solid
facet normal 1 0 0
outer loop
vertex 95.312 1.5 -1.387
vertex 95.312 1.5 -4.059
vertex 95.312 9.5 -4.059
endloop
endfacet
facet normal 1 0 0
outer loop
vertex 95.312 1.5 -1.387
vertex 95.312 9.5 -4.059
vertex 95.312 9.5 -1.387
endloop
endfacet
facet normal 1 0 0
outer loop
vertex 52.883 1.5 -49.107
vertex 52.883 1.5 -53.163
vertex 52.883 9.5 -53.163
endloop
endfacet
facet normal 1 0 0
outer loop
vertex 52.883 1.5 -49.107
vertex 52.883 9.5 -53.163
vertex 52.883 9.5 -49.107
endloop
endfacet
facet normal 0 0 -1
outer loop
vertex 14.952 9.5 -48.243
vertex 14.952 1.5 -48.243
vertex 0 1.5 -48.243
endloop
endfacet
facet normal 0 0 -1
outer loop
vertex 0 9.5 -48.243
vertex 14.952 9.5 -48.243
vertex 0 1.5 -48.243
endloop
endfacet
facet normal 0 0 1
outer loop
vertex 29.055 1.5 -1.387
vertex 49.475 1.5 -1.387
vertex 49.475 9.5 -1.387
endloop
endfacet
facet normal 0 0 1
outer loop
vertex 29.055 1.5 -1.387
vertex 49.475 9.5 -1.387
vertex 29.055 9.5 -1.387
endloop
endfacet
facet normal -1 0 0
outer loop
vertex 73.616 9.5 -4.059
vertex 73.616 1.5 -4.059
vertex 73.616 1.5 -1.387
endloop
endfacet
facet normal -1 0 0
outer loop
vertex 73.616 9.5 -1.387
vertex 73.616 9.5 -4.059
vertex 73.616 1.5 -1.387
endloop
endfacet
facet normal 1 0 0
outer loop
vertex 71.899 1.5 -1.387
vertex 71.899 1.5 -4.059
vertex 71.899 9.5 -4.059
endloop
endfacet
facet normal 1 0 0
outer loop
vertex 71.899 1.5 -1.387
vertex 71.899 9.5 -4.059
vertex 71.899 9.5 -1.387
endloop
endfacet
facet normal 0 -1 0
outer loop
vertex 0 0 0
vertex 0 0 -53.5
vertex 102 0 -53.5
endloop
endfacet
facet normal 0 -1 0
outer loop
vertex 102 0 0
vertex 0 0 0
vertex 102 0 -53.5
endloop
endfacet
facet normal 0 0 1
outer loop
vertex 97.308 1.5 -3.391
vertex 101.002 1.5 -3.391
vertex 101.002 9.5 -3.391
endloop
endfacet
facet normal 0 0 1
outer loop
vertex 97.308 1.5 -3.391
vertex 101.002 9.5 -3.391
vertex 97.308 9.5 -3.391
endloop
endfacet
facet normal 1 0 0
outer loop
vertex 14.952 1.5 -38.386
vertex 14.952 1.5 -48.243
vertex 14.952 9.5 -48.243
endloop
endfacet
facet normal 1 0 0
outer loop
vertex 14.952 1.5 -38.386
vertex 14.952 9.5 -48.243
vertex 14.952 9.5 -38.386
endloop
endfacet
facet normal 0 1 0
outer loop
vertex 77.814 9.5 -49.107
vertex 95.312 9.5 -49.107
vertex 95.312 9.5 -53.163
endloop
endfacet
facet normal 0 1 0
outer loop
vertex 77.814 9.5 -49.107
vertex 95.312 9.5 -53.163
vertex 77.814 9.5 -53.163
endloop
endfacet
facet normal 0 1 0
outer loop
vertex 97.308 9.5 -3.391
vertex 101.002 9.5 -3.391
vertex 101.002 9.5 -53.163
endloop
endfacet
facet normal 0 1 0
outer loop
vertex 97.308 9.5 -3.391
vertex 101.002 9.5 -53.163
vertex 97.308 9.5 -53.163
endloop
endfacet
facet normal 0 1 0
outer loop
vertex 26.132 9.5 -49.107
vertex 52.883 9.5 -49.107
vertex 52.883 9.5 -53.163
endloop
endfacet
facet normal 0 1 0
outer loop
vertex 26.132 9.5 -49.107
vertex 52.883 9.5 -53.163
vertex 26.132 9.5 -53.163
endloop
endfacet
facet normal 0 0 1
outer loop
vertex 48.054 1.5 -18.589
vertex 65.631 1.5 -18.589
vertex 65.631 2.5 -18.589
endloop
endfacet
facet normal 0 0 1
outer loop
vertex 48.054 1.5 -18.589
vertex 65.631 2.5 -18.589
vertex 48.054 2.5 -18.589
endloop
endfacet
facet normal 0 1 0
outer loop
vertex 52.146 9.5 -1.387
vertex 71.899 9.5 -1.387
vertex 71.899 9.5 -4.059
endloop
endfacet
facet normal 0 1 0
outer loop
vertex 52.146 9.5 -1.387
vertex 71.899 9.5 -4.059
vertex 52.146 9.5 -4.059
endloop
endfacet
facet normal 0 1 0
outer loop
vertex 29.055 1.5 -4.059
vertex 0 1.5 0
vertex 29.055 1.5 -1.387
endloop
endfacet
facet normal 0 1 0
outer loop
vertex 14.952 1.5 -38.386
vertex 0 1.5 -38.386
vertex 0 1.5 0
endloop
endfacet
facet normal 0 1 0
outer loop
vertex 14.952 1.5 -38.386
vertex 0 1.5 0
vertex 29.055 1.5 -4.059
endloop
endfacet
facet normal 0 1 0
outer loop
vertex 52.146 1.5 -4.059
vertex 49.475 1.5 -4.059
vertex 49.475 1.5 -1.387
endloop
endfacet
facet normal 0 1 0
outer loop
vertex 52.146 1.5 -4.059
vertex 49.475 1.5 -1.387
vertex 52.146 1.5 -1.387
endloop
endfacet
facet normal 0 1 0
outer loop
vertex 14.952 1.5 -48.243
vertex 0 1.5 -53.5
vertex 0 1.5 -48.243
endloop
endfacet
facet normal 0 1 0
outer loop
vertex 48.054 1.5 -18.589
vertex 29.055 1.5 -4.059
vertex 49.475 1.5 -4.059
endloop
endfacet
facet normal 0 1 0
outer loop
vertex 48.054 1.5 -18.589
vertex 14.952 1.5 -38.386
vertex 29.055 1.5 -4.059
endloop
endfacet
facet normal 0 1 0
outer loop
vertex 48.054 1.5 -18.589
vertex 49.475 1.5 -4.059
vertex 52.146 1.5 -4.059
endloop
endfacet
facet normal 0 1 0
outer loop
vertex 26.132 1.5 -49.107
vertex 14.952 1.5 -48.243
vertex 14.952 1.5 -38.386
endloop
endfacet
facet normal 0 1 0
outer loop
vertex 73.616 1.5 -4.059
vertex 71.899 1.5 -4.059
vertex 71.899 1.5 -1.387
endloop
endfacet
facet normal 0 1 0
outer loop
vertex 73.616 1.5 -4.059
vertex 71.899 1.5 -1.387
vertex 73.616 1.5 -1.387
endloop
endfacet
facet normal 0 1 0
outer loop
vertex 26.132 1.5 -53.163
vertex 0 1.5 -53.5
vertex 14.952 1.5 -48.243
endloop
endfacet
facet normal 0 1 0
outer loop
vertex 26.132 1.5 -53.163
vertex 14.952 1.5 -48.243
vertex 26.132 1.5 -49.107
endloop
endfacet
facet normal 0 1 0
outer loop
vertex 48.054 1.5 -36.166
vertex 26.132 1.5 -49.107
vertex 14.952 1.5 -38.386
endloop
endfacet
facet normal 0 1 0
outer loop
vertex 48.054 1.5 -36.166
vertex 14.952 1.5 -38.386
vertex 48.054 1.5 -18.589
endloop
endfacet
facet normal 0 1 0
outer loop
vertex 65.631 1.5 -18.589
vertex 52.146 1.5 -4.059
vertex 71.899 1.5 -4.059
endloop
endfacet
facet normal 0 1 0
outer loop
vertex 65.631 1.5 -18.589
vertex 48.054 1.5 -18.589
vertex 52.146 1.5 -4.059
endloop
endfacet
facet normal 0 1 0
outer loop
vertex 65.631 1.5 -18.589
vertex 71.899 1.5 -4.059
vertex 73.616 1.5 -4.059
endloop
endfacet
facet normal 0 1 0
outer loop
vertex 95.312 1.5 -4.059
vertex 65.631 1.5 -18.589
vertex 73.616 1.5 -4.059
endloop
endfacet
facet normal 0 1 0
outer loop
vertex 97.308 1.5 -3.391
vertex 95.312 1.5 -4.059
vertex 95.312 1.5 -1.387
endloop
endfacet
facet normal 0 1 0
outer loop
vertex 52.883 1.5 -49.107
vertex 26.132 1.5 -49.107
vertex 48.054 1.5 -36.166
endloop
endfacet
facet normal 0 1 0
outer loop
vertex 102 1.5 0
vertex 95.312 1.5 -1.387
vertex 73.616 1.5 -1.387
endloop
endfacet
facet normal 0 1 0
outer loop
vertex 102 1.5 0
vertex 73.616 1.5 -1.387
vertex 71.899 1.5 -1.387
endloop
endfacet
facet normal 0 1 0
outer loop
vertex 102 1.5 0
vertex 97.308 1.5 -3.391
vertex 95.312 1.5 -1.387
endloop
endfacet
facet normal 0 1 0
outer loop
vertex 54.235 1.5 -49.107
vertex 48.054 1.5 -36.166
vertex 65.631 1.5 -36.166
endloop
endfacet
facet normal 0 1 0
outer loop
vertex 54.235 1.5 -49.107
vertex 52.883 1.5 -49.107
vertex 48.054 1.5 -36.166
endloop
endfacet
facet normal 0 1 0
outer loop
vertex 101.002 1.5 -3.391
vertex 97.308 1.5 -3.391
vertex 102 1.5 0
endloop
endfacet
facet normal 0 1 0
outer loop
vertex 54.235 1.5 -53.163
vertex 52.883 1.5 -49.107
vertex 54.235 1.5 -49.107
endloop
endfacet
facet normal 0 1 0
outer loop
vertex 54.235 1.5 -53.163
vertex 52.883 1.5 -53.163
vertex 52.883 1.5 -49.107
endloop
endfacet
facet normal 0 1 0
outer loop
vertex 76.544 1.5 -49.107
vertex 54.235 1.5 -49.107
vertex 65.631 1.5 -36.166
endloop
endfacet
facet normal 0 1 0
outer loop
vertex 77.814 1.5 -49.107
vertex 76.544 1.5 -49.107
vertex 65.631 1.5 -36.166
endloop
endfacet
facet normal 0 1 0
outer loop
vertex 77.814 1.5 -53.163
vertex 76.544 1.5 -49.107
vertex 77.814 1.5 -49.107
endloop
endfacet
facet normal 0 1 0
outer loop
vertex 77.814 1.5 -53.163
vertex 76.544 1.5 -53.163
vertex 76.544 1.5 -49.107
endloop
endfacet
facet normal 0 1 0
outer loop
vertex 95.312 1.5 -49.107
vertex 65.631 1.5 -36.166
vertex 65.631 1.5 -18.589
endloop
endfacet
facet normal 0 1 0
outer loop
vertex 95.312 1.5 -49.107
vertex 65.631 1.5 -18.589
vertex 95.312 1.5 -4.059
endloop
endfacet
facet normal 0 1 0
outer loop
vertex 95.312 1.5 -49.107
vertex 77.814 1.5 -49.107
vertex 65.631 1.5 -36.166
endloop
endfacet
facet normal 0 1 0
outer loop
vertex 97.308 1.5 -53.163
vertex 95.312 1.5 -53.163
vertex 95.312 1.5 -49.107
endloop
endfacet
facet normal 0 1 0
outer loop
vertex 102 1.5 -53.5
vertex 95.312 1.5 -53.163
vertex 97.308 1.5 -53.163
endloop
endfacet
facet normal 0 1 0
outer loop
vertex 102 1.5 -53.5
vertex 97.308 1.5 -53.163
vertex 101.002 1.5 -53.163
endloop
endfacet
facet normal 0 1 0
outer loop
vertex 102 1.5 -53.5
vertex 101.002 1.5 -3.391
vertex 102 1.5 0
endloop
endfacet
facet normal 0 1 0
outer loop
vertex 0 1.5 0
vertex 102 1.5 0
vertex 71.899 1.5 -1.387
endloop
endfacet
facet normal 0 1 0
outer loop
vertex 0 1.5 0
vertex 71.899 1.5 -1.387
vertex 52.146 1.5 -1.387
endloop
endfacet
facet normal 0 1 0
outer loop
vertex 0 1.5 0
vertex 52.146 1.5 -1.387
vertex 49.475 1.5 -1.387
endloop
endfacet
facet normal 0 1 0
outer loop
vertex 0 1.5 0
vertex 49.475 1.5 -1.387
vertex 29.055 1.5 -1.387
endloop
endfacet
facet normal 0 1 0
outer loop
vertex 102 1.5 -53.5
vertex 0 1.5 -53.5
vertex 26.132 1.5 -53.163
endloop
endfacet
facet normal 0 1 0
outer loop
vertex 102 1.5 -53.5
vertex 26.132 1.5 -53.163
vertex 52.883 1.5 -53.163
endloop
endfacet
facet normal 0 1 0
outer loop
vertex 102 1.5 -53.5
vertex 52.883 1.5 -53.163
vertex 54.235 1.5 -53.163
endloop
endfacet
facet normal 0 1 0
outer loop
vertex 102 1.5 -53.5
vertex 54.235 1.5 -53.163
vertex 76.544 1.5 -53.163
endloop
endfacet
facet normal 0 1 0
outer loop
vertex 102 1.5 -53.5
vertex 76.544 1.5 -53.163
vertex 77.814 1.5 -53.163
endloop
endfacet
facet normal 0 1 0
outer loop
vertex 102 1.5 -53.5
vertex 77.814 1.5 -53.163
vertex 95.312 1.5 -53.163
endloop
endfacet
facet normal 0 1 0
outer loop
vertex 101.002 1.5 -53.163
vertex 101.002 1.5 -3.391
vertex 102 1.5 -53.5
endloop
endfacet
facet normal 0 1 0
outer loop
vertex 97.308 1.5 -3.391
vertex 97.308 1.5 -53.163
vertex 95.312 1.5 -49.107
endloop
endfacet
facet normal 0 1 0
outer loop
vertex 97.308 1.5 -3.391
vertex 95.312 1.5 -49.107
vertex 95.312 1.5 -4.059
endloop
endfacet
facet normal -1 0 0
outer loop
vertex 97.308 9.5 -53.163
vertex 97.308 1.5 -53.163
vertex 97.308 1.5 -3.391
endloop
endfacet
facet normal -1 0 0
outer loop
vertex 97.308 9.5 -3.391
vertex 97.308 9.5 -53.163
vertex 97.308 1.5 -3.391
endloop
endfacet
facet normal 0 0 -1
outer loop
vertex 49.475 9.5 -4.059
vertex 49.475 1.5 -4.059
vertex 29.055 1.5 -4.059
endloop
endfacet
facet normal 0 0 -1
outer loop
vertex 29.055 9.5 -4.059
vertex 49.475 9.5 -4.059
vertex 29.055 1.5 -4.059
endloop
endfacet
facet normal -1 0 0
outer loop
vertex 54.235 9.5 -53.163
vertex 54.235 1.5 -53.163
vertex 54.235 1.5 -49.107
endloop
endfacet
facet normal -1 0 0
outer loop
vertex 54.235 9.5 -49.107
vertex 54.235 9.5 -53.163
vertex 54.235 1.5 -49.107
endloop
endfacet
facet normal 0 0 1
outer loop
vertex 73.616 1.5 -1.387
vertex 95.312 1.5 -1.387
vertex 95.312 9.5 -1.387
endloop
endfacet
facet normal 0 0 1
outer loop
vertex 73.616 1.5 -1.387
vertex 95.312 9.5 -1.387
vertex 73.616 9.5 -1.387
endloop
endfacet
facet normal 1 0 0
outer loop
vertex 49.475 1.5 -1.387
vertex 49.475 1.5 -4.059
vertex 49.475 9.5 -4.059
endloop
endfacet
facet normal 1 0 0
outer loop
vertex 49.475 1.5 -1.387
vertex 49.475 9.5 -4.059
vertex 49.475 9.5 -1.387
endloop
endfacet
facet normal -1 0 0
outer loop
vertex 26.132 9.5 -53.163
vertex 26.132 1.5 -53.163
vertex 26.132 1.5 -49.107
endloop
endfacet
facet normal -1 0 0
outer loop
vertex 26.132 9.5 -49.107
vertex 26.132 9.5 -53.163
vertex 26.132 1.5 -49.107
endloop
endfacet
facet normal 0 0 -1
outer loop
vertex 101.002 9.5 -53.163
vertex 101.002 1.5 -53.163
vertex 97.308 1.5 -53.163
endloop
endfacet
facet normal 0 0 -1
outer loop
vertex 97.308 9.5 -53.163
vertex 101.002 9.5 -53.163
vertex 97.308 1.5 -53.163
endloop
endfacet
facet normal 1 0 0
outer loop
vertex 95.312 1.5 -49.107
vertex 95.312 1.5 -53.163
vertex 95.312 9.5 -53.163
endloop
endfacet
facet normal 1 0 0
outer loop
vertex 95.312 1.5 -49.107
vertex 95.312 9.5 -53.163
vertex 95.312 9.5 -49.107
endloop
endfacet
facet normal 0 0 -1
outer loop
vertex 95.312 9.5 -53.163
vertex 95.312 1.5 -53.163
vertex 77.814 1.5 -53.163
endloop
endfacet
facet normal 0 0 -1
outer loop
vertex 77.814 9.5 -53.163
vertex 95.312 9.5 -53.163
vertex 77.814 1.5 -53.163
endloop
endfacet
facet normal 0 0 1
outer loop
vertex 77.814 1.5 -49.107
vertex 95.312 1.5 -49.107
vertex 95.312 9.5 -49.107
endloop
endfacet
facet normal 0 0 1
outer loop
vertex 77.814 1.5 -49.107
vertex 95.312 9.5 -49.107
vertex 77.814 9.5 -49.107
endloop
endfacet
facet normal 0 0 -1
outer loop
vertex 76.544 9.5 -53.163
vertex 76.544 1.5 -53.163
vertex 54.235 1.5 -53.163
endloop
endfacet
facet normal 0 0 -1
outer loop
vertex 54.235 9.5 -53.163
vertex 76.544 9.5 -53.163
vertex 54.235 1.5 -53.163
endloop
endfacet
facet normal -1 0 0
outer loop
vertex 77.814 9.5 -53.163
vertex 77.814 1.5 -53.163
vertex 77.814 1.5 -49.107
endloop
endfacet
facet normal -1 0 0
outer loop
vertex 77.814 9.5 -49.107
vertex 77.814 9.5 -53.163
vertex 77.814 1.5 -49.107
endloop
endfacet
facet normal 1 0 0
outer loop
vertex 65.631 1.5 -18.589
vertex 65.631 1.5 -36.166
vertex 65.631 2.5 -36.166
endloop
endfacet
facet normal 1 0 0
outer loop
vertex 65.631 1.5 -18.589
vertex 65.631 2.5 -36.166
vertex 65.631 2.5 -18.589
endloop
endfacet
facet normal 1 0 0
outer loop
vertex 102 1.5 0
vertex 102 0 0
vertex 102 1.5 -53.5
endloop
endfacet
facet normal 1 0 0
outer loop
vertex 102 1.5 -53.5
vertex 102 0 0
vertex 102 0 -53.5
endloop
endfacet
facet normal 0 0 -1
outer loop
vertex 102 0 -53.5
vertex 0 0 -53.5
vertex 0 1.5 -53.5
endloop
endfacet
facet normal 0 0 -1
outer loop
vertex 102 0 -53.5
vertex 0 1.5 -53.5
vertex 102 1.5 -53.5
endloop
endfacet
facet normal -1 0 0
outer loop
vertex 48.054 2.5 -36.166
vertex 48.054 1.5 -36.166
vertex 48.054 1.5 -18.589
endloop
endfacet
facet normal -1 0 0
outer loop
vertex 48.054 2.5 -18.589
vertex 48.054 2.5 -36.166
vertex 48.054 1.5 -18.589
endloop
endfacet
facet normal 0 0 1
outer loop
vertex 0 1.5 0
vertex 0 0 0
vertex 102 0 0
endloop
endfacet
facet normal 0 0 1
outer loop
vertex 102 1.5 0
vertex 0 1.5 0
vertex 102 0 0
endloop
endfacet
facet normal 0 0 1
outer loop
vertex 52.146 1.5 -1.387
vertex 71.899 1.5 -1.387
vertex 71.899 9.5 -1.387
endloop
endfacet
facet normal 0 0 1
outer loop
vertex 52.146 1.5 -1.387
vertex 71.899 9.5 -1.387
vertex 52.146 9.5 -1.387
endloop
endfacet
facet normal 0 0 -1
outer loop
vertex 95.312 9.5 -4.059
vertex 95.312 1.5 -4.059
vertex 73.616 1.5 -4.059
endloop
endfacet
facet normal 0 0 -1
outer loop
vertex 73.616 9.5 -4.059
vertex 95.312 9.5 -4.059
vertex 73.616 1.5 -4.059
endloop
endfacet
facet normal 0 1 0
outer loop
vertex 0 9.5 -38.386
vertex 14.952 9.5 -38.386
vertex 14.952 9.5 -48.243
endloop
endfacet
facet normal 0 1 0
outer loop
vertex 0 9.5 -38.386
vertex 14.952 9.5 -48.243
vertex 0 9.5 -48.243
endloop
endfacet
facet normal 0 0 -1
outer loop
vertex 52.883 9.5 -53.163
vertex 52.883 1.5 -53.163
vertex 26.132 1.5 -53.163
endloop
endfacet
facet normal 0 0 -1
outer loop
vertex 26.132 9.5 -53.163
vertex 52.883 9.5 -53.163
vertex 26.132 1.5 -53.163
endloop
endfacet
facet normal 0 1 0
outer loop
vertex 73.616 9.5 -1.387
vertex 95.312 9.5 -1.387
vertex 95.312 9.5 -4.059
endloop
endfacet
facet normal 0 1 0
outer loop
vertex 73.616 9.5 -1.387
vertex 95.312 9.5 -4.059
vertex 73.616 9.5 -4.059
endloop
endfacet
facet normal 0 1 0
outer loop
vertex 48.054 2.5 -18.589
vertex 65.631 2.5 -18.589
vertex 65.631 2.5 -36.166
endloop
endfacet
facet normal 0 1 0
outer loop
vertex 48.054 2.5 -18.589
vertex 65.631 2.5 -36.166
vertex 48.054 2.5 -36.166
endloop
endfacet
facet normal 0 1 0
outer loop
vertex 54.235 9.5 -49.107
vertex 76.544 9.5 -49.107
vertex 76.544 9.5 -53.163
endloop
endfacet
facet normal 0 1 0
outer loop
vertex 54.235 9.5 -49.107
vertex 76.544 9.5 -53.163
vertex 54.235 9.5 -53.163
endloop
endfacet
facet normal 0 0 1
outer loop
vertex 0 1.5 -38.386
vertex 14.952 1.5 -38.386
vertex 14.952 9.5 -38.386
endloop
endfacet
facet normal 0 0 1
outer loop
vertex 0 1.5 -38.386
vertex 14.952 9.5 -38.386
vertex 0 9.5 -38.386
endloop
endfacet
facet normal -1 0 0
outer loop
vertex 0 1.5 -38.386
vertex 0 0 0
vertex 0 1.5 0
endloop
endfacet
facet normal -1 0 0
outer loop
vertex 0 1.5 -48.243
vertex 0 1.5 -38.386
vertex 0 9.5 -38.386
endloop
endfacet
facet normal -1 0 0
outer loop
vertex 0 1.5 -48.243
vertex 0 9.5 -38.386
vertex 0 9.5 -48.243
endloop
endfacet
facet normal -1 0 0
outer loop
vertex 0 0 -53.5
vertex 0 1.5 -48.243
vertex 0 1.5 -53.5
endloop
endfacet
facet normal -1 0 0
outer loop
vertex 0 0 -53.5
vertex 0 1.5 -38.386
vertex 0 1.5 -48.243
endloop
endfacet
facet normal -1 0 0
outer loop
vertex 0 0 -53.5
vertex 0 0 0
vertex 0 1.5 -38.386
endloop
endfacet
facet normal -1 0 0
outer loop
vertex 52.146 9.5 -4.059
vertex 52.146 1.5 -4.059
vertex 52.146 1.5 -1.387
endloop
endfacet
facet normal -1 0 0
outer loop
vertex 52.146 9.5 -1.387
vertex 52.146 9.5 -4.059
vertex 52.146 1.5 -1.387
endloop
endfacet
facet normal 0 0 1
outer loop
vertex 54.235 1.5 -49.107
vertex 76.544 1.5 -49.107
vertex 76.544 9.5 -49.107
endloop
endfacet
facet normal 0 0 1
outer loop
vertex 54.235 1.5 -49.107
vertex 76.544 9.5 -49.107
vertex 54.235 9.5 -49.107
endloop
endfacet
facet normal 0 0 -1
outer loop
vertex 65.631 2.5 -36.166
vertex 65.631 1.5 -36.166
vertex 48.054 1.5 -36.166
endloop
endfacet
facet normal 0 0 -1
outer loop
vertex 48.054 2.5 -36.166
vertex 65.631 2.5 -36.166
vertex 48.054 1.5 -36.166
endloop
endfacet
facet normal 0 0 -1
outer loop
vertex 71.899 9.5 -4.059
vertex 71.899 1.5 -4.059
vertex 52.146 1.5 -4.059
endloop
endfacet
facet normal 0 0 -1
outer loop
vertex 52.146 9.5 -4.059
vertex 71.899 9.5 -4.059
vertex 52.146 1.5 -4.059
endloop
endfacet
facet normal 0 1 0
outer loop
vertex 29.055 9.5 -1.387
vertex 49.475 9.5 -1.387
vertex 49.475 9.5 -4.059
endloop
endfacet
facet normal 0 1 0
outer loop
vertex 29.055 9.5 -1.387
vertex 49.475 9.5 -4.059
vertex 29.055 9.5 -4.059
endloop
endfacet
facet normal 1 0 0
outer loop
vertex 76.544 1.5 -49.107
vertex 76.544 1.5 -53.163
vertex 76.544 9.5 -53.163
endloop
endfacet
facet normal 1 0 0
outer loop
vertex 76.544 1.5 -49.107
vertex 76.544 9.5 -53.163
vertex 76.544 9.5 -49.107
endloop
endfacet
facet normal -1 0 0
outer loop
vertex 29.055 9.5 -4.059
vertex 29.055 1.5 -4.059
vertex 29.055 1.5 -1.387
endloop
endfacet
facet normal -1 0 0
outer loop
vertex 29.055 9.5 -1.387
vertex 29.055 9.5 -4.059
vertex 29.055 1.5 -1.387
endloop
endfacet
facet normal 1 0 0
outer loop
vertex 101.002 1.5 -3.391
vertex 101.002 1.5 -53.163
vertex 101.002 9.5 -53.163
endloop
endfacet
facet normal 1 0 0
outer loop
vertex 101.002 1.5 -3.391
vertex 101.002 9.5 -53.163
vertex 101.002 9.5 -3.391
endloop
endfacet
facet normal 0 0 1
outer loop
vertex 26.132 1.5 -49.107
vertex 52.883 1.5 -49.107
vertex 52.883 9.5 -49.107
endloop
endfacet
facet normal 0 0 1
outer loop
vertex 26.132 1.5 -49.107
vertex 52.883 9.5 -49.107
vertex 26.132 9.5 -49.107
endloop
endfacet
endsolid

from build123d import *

# Parameters (mm, degrees)
SKETCH1_W           = 102
SKETCH1_H           = 53.5
BOSS_EXTRUDE1_DEPTH = 1.5
SKETCH2_W           = 14.952348819
SKETCH2_H           = 9.85729203
BOSS_EXTRUDE2_DEPTH = 8
SKETCH3_W           = 26.751318109
SKETCH3_H           = 4.056156536
SKETCH3_W_2         = 22.308860949
SKETCH3_W_3         = 17.497554299
SKETCH3_W_4         = 3.694182794
SKETCH3_H_2         = 49.772168178
SKETCH3_W_5         = 21.695691939
SKETCH3_H_3         = 2.671784729
SKETCH3_W_6         = 19.752122819
SKETCH3_W_7         = 20.420069002
BOSS_EXTRUDE3_DEPTH = 8
SKETCH4_W           = 17.576678325
SKETCH4_H           = 17.576678325
BOSS_EXTRUDE4_DEPTH = 1


with BuildPart() as part:
    # Sketch1 → Boss-Extrude1 (new body)
    with BuildSketch(Plane(origin=(0, 0, 0), x_dir=(1, 0, 0), z_dir=(0, 1, 0))):
        with Locations((51, 26.75)):
            Rectangle(SKETCH1_W, SKETCH1_H)
    extrude(amount=BOSS_EXTRUDE1_DEPTH)

    # Sketch2 → Boss-Extrude2 (add)
    with BuildSketch(Plane(origin=(0, 1.5, 0), x_dir=(-1, 0, 0), z_dir=(0, 1, 0))):
        with Locations((-7.47617441, -43.314315473)):
            Rectangle(SKETCH2_W, SKETCH2_H)
    extrude(amount=BOSS_EXTRUDE2_DEPTH)

    # Sketch3 → Boss-Extrude3 (add)
    with BuildSketch(Plane(origin=(0, 1.5, 0), x_dir=(-1, 0, 0), z_dir=(0, 1, 0))):
        with Locations((-39.507531481, -51.135226796)):
            Rectangle(SKETCH3_W, SKETCH3_H)
        with Locations((-65.389673188, -51.135226796)):
            Rectangle(SKETCH3_W_2, SKETCH3_H)
        with Locations((-86.563053436, -51.135226796)):
            Rectangle(SKETCH3_W_3, SKETCH3_H)
        with Locations((-99.154840724, -28.277220975)):
            Rectangle(SKETCH3_W_4, SKETCH3_H_2)
        with Locations((-84.463984616, -2.723190704)):
            Rectangle(SKETCH3_W_5, SKETCH3_H_3)
        with Locations((-62.02250134, -2.723190704)):
            Rectangle(SKETCH3_W_6, SKETCH3_H_3)
        with Locations((-39.2646207, -2.723190704)):
            Rectangle(SKETCH3_W_7, SKETCH3_H_3)
    extrude(amount=BOSS_EXTRUDE3_DEPTH)

    # Sketch4 → Boss-Extrude4 (add)
    with BuildSketch(Plane(origin=(0, 1.5, 0), x_dir=(-1, 0, 0), z_dir=(0, 1, 0))):
        with Locations((-56.842771916, -27.377738511)):
            Rectangle(SKETCH4_W, SKETCH4_H)
    extrude(amount=BOSS_EXTRUDE4_DEPTH)


solid = part.part
